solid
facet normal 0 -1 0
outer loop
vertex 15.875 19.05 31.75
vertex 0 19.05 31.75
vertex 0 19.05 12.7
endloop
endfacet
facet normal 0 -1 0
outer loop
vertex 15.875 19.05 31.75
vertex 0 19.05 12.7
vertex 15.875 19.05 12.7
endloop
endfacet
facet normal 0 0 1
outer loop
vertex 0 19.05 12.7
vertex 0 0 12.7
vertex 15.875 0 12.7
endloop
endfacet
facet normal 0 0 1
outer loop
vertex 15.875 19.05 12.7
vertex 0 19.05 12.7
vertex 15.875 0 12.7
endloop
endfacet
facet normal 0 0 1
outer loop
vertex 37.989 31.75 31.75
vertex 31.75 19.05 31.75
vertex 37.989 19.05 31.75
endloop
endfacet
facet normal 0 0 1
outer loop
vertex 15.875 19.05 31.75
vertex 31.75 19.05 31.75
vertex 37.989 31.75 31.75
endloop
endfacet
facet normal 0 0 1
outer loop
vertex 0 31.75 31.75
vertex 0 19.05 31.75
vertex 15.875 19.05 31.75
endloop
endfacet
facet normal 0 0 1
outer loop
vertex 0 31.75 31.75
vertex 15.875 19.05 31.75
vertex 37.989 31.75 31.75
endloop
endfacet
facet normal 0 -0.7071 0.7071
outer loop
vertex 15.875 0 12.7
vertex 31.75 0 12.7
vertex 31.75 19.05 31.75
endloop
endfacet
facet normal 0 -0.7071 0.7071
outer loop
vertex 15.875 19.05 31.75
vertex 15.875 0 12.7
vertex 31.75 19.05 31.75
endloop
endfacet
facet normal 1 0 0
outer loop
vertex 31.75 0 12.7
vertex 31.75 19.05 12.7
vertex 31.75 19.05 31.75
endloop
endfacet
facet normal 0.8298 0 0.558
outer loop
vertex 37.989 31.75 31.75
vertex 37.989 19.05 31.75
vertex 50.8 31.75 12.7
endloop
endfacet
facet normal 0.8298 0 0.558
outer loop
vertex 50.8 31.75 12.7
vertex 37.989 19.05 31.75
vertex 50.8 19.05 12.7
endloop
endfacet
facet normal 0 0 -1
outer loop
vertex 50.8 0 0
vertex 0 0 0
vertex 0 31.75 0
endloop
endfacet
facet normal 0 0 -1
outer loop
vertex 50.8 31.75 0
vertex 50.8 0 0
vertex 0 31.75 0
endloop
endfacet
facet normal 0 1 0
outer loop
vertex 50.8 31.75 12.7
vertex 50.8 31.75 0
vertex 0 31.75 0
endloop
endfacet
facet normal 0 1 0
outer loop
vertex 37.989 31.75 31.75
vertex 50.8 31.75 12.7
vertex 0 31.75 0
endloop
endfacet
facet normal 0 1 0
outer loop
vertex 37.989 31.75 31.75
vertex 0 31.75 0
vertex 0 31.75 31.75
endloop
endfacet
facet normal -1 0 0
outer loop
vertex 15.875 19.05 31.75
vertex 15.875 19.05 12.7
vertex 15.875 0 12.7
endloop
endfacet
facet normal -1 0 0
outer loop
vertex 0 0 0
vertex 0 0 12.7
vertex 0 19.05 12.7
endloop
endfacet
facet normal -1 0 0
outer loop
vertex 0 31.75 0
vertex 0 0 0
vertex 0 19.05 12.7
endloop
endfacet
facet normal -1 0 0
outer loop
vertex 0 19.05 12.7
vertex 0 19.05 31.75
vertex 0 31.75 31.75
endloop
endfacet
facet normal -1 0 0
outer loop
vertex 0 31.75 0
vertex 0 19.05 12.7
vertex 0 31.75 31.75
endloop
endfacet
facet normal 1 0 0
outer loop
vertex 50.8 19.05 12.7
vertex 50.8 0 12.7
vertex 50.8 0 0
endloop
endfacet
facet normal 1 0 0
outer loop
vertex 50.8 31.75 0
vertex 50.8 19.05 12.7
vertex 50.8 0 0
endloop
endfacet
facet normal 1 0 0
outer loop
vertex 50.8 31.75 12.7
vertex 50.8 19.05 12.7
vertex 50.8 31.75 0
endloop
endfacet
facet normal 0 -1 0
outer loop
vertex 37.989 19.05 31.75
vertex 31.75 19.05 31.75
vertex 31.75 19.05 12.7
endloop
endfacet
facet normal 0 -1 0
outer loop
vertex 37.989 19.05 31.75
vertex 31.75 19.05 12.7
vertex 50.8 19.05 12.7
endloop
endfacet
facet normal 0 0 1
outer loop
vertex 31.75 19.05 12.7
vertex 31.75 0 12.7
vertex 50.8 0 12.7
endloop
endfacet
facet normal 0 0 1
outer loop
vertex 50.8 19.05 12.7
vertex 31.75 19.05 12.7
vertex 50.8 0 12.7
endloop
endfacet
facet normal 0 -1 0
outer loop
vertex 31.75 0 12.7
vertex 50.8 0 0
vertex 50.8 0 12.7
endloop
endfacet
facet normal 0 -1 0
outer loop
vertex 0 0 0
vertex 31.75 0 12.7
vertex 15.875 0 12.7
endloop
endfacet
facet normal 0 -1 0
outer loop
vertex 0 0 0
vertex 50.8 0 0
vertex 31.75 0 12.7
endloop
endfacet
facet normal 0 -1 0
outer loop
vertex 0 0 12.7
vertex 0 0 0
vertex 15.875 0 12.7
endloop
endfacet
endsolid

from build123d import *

# Parameters (mm, degrees)
F0_W     = 31.75
F0_H     = 31.75
F1_DEPTH = 50.8
F2_W     = 19.05
F2_H     = 19.05
F3_DEPTH = 19.05
F4_W     = 15.875
F4_H     = 19.05
F5_DEPTH = 19.05
F7_DEPTH = 25.4
F9_DEPTH = 12.7


with BuildPart() as f1:
    # F0 (on Right) → F1 (new body)
    with BuildSketch(Plane.YZ):
        with Locations((15.875, 15.875)):
            Rectangle(F0_W, F0_H)
    extrude(amount=F1_DEPTH)

    # F2 (on face) → F3 (cut)
    with BuildSketch(Plane.XZ):
        with Locations((41.275, 22.225)):
            Rectangle(F2_W, F2_H)
    extrude(amount=-F3_DEPTH, mode=Mode.SUBTRACT)

    # F4 (on face) → F5 (cut)
    with BuildSketch(Plane.XZ):
        with Locations((7.9375, 22.225)):
            Rectangle(F4_W, F4_H)
    extrude(amount=-F5_DEPTH, mode=Mode.SUBTRACT)

    # F6 (on face) → F7 (cut)
    with BuildSketch(Plane.YZ.offset(31.75)):
        Polygon((0, 31.75), (0, 12.7), (19.05, 31.75), align=None)
    extrude(amount=-F7_DEPTH, mode=Mode.SUBTRACT)

    # F8 (on face) → F9 (cut)
    with BuildSketch(Plane.XZ.offset(-19.05)):
        Polygon((50.8, 12.7), (50.8, 31.75), (37.9892475903, 31.75), align=None)
    extrude(amount=-F9_DEPTH, mode=Mode.SUBTRACT)


solid = f1.part
